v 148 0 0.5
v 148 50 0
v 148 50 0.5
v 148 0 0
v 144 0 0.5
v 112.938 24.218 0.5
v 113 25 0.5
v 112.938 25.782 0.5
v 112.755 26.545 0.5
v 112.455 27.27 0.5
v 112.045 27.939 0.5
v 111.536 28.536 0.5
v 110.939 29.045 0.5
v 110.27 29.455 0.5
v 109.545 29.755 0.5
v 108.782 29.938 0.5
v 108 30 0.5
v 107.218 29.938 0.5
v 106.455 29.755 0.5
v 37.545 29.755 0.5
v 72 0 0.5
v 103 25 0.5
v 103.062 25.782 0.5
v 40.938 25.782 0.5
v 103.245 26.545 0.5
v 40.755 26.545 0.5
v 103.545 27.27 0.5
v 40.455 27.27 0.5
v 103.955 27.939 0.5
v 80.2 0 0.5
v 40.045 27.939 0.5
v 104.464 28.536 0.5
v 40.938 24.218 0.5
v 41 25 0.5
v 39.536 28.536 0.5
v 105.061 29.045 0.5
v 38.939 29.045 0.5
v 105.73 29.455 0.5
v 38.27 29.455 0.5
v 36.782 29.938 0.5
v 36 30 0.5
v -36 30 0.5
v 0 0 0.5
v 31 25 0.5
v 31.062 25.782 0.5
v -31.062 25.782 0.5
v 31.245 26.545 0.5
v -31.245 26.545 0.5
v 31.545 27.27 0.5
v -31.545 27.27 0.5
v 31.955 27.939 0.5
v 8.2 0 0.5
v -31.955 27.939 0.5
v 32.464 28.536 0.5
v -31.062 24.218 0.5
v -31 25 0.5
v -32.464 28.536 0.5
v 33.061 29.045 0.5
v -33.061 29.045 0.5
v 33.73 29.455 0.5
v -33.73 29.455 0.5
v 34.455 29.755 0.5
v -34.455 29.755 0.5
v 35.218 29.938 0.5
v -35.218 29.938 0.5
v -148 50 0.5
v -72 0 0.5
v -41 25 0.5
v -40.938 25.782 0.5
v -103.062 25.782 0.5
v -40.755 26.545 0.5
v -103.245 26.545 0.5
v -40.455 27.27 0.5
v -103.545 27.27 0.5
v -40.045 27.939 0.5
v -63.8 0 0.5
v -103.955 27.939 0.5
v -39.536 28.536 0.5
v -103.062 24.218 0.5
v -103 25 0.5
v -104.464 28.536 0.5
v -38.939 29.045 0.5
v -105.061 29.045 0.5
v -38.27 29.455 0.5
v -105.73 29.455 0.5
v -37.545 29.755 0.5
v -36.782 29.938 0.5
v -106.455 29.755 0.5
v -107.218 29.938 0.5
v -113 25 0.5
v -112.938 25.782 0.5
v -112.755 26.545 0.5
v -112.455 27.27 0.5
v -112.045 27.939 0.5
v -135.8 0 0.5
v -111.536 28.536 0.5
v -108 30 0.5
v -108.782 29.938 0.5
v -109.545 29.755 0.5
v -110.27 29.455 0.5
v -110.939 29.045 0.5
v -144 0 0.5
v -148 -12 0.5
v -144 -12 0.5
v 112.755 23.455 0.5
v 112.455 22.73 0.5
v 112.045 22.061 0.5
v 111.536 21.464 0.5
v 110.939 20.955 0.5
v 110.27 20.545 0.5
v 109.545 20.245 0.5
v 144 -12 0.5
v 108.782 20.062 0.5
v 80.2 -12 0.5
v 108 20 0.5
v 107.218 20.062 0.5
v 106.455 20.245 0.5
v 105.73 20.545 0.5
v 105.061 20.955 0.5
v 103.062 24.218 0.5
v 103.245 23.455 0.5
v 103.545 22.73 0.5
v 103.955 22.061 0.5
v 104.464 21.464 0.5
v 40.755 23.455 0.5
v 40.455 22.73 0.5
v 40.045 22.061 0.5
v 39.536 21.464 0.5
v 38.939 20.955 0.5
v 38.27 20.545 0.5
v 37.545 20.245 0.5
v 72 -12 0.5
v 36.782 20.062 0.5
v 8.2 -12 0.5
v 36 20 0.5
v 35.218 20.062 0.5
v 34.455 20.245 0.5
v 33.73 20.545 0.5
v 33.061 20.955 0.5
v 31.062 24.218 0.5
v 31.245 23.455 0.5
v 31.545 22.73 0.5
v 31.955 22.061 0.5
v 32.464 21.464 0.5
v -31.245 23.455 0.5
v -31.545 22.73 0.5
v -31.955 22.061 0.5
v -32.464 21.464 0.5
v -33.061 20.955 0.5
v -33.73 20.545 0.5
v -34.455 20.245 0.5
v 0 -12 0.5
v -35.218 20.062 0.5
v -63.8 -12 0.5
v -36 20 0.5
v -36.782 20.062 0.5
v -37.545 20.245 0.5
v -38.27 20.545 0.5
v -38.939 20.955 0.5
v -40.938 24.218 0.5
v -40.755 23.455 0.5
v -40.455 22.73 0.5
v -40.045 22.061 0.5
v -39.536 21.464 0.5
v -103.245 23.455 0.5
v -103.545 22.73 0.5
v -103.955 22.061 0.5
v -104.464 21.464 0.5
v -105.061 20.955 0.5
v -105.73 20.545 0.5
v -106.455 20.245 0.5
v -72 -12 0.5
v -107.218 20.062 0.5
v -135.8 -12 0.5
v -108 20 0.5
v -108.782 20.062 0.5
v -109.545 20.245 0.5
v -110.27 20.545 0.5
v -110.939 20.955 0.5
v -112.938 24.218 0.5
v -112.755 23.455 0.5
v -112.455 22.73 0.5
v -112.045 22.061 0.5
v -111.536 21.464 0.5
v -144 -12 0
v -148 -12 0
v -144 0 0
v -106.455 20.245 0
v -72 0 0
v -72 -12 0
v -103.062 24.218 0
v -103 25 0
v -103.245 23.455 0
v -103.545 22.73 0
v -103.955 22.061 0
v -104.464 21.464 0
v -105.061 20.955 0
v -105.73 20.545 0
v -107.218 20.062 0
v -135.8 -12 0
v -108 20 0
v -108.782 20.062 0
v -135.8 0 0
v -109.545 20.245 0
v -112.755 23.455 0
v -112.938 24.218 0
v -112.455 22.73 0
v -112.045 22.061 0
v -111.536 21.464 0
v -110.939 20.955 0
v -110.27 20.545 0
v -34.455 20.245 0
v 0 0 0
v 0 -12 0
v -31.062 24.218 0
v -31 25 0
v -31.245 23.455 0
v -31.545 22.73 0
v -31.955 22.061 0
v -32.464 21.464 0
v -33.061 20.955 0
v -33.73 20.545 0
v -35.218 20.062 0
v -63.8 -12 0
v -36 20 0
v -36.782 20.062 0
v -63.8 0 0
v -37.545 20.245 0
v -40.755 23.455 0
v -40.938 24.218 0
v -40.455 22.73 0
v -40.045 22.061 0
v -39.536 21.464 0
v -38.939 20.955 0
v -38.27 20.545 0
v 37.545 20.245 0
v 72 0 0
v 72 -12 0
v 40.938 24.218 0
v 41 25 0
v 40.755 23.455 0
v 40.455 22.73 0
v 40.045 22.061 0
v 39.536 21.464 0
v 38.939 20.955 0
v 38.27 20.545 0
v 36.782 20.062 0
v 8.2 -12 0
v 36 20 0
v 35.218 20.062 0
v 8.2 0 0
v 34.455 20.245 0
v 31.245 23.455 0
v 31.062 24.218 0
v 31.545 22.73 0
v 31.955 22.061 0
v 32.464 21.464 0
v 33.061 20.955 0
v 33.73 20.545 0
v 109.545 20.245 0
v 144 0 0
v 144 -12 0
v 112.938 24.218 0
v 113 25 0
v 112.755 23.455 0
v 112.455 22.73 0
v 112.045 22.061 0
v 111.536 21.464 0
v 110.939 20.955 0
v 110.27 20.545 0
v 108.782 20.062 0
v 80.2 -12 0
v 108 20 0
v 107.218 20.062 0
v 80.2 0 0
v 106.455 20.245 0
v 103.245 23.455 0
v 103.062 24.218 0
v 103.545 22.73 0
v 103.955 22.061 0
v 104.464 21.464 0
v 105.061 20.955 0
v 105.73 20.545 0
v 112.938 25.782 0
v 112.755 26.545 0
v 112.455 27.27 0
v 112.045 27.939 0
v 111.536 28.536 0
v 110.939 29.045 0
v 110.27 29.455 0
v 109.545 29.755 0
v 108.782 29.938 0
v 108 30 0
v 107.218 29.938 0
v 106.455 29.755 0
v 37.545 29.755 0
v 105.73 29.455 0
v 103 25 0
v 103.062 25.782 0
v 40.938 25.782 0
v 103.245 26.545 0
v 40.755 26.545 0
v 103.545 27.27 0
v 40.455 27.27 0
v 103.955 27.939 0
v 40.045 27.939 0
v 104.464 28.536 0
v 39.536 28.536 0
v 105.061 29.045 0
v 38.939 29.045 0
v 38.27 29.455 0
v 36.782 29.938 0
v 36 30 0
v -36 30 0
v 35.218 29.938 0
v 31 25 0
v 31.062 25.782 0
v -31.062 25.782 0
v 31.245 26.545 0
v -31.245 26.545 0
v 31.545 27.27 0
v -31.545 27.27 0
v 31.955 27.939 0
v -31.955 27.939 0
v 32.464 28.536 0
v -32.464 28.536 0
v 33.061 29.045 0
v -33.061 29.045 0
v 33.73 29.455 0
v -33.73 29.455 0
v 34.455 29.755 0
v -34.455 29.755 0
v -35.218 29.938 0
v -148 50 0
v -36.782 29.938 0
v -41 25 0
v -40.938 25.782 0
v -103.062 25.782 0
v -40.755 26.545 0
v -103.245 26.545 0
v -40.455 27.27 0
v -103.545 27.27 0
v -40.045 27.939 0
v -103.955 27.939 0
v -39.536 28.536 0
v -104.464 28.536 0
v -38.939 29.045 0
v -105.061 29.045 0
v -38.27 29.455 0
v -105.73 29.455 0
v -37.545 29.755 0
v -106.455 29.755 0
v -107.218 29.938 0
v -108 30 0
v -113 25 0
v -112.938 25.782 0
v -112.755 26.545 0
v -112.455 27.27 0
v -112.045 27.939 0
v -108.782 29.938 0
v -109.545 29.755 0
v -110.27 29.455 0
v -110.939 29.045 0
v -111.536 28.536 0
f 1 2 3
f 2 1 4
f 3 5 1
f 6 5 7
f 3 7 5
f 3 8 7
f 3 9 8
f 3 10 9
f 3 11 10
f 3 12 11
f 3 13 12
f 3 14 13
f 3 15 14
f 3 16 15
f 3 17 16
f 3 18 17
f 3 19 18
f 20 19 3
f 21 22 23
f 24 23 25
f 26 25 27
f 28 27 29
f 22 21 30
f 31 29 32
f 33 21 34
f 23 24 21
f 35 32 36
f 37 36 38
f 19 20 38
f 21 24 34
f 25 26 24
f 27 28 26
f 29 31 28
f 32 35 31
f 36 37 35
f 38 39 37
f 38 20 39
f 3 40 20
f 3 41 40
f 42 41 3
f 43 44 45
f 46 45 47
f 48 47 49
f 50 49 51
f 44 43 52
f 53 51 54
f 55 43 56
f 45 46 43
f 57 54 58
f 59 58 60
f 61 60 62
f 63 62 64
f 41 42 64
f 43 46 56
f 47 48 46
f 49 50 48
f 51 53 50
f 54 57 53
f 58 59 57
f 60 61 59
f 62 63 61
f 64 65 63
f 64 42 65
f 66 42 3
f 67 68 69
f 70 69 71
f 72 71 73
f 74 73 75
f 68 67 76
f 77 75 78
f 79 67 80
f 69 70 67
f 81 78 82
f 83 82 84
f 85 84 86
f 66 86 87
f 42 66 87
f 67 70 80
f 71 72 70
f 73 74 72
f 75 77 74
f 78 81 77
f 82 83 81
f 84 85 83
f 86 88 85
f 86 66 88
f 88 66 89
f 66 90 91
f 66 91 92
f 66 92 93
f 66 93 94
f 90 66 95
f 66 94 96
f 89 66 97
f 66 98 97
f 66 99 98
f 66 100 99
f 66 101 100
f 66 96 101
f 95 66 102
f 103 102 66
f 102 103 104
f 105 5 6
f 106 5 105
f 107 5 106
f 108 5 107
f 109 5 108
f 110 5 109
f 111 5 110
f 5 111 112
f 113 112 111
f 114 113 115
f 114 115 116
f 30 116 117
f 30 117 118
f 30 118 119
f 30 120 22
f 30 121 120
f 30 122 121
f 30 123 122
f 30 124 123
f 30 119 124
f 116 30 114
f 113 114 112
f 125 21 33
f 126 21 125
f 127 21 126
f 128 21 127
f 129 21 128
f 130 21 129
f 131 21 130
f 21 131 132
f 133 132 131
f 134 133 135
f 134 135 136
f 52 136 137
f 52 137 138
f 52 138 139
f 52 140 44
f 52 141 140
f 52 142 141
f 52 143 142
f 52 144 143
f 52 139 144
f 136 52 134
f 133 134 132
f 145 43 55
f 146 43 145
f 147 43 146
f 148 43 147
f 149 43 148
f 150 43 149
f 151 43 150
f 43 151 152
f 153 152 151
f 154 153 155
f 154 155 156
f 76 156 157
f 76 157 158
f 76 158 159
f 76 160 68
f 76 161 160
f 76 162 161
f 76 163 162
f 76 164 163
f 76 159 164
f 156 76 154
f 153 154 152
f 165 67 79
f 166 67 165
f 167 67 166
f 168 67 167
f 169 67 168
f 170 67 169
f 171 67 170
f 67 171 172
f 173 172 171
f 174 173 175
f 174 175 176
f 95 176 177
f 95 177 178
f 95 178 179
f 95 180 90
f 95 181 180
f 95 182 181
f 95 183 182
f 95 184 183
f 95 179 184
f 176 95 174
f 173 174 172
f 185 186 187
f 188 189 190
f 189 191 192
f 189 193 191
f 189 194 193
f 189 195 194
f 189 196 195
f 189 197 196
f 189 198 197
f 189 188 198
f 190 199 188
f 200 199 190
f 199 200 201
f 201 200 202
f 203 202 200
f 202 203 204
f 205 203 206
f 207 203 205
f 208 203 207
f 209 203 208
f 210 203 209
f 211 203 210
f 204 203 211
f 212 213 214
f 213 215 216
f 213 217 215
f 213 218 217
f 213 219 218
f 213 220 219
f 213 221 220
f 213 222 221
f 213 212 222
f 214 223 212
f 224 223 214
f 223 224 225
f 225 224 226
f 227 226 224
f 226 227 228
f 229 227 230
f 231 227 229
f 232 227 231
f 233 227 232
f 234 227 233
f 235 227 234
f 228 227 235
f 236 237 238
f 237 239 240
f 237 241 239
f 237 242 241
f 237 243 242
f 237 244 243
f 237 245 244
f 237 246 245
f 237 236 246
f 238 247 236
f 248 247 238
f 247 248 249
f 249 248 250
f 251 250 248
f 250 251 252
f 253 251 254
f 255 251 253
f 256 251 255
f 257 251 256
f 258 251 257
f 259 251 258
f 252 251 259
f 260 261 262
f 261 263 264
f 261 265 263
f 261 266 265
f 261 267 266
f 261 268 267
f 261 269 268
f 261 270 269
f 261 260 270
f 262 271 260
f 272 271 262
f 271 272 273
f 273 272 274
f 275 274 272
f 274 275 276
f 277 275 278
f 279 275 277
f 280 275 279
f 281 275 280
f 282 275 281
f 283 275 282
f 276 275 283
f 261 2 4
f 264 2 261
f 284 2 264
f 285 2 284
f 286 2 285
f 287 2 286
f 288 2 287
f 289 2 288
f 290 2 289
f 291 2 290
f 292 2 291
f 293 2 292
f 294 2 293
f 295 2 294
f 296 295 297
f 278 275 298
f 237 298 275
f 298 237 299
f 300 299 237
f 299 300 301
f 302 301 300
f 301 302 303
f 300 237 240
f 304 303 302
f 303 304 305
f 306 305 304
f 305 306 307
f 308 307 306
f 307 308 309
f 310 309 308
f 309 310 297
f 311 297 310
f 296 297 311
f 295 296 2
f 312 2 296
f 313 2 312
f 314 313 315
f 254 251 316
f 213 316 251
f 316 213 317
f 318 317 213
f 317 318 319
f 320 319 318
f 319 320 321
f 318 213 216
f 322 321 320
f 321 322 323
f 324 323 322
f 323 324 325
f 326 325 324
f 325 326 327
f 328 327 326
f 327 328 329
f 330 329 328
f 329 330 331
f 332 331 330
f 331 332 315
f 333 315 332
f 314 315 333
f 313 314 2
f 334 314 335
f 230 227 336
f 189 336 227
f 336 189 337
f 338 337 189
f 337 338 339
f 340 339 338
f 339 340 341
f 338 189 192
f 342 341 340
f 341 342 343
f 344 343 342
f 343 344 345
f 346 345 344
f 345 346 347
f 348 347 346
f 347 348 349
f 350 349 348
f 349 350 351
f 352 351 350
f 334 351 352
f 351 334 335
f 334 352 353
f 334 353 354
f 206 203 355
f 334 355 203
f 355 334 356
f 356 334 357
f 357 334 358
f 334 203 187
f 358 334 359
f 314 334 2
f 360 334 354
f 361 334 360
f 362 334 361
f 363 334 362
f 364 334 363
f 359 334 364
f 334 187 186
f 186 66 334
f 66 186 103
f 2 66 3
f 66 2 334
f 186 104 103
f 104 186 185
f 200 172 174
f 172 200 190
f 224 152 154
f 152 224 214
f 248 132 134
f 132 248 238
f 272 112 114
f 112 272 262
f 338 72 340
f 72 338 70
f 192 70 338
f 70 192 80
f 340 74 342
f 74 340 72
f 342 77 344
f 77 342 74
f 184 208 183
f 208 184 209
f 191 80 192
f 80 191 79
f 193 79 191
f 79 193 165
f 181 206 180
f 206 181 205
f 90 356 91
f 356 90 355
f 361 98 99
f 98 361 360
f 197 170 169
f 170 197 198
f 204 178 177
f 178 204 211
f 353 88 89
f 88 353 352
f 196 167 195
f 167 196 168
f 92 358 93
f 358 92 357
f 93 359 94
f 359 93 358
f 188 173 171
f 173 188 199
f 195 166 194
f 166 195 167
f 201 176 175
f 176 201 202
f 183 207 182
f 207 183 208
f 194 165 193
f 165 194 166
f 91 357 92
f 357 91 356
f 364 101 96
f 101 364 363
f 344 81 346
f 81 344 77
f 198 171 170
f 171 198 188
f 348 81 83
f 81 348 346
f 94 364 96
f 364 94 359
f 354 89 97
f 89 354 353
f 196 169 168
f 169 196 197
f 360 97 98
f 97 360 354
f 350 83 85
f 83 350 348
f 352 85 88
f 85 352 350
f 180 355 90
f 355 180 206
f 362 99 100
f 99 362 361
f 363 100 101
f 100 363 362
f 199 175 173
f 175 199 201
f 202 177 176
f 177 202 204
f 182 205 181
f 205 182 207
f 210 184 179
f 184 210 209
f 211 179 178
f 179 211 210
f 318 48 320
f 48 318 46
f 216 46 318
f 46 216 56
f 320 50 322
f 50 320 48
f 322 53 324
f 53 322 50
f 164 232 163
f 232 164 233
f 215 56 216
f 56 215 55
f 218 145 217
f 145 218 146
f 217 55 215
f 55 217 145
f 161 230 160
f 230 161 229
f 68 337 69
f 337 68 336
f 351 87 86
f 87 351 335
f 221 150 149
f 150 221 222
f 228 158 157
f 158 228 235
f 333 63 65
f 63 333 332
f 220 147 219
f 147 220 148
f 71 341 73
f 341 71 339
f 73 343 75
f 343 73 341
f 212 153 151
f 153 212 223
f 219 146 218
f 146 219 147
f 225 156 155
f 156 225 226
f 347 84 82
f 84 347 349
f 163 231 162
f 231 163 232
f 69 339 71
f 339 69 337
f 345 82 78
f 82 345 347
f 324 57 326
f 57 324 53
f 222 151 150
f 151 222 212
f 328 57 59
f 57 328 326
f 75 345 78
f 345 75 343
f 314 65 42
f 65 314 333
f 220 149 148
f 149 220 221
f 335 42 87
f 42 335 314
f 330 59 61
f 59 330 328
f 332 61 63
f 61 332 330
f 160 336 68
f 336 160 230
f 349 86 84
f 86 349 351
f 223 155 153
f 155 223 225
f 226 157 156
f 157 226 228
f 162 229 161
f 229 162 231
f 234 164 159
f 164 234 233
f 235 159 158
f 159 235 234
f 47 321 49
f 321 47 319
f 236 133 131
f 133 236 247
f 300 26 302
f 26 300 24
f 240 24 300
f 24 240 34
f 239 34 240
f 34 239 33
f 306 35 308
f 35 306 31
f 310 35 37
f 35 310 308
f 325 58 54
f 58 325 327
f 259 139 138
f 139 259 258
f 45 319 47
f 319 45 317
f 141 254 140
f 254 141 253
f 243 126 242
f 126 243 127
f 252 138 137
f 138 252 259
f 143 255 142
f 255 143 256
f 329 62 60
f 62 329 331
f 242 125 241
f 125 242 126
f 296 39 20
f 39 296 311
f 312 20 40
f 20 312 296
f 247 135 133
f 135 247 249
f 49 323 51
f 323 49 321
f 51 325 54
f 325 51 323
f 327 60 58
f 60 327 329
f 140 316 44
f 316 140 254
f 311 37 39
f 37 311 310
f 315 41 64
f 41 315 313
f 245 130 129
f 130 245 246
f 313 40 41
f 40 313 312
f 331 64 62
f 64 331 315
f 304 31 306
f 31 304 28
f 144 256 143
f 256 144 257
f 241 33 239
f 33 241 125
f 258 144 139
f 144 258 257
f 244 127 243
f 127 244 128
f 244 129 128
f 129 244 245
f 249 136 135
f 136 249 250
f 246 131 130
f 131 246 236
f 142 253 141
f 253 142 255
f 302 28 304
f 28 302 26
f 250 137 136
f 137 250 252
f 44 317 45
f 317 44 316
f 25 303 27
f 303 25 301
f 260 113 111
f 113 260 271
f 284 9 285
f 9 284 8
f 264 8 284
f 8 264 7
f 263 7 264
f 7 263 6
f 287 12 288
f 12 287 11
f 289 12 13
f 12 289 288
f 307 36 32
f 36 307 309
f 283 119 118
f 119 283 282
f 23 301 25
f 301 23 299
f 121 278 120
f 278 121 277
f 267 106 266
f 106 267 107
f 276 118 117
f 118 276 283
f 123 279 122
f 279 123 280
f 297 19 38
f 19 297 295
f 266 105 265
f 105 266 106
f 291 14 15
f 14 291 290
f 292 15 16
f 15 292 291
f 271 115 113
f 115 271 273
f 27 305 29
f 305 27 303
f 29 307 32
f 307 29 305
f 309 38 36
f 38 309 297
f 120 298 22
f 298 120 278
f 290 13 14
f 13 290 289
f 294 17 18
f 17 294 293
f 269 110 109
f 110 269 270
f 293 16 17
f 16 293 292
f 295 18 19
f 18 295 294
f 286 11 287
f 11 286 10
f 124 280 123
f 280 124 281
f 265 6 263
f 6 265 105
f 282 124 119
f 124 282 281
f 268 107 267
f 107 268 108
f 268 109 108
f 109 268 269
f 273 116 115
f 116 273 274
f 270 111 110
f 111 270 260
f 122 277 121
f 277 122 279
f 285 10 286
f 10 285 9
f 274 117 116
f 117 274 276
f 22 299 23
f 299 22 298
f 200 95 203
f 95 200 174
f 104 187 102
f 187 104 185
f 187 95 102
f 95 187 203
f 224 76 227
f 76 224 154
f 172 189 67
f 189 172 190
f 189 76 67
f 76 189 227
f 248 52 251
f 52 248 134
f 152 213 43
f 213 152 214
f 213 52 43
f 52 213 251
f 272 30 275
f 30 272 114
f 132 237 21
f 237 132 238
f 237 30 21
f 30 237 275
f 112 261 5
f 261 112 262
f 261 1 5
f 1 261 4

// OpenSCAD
include <../lib/filament-spool-roller-lib.scad>;
$fn = 40;
template();
